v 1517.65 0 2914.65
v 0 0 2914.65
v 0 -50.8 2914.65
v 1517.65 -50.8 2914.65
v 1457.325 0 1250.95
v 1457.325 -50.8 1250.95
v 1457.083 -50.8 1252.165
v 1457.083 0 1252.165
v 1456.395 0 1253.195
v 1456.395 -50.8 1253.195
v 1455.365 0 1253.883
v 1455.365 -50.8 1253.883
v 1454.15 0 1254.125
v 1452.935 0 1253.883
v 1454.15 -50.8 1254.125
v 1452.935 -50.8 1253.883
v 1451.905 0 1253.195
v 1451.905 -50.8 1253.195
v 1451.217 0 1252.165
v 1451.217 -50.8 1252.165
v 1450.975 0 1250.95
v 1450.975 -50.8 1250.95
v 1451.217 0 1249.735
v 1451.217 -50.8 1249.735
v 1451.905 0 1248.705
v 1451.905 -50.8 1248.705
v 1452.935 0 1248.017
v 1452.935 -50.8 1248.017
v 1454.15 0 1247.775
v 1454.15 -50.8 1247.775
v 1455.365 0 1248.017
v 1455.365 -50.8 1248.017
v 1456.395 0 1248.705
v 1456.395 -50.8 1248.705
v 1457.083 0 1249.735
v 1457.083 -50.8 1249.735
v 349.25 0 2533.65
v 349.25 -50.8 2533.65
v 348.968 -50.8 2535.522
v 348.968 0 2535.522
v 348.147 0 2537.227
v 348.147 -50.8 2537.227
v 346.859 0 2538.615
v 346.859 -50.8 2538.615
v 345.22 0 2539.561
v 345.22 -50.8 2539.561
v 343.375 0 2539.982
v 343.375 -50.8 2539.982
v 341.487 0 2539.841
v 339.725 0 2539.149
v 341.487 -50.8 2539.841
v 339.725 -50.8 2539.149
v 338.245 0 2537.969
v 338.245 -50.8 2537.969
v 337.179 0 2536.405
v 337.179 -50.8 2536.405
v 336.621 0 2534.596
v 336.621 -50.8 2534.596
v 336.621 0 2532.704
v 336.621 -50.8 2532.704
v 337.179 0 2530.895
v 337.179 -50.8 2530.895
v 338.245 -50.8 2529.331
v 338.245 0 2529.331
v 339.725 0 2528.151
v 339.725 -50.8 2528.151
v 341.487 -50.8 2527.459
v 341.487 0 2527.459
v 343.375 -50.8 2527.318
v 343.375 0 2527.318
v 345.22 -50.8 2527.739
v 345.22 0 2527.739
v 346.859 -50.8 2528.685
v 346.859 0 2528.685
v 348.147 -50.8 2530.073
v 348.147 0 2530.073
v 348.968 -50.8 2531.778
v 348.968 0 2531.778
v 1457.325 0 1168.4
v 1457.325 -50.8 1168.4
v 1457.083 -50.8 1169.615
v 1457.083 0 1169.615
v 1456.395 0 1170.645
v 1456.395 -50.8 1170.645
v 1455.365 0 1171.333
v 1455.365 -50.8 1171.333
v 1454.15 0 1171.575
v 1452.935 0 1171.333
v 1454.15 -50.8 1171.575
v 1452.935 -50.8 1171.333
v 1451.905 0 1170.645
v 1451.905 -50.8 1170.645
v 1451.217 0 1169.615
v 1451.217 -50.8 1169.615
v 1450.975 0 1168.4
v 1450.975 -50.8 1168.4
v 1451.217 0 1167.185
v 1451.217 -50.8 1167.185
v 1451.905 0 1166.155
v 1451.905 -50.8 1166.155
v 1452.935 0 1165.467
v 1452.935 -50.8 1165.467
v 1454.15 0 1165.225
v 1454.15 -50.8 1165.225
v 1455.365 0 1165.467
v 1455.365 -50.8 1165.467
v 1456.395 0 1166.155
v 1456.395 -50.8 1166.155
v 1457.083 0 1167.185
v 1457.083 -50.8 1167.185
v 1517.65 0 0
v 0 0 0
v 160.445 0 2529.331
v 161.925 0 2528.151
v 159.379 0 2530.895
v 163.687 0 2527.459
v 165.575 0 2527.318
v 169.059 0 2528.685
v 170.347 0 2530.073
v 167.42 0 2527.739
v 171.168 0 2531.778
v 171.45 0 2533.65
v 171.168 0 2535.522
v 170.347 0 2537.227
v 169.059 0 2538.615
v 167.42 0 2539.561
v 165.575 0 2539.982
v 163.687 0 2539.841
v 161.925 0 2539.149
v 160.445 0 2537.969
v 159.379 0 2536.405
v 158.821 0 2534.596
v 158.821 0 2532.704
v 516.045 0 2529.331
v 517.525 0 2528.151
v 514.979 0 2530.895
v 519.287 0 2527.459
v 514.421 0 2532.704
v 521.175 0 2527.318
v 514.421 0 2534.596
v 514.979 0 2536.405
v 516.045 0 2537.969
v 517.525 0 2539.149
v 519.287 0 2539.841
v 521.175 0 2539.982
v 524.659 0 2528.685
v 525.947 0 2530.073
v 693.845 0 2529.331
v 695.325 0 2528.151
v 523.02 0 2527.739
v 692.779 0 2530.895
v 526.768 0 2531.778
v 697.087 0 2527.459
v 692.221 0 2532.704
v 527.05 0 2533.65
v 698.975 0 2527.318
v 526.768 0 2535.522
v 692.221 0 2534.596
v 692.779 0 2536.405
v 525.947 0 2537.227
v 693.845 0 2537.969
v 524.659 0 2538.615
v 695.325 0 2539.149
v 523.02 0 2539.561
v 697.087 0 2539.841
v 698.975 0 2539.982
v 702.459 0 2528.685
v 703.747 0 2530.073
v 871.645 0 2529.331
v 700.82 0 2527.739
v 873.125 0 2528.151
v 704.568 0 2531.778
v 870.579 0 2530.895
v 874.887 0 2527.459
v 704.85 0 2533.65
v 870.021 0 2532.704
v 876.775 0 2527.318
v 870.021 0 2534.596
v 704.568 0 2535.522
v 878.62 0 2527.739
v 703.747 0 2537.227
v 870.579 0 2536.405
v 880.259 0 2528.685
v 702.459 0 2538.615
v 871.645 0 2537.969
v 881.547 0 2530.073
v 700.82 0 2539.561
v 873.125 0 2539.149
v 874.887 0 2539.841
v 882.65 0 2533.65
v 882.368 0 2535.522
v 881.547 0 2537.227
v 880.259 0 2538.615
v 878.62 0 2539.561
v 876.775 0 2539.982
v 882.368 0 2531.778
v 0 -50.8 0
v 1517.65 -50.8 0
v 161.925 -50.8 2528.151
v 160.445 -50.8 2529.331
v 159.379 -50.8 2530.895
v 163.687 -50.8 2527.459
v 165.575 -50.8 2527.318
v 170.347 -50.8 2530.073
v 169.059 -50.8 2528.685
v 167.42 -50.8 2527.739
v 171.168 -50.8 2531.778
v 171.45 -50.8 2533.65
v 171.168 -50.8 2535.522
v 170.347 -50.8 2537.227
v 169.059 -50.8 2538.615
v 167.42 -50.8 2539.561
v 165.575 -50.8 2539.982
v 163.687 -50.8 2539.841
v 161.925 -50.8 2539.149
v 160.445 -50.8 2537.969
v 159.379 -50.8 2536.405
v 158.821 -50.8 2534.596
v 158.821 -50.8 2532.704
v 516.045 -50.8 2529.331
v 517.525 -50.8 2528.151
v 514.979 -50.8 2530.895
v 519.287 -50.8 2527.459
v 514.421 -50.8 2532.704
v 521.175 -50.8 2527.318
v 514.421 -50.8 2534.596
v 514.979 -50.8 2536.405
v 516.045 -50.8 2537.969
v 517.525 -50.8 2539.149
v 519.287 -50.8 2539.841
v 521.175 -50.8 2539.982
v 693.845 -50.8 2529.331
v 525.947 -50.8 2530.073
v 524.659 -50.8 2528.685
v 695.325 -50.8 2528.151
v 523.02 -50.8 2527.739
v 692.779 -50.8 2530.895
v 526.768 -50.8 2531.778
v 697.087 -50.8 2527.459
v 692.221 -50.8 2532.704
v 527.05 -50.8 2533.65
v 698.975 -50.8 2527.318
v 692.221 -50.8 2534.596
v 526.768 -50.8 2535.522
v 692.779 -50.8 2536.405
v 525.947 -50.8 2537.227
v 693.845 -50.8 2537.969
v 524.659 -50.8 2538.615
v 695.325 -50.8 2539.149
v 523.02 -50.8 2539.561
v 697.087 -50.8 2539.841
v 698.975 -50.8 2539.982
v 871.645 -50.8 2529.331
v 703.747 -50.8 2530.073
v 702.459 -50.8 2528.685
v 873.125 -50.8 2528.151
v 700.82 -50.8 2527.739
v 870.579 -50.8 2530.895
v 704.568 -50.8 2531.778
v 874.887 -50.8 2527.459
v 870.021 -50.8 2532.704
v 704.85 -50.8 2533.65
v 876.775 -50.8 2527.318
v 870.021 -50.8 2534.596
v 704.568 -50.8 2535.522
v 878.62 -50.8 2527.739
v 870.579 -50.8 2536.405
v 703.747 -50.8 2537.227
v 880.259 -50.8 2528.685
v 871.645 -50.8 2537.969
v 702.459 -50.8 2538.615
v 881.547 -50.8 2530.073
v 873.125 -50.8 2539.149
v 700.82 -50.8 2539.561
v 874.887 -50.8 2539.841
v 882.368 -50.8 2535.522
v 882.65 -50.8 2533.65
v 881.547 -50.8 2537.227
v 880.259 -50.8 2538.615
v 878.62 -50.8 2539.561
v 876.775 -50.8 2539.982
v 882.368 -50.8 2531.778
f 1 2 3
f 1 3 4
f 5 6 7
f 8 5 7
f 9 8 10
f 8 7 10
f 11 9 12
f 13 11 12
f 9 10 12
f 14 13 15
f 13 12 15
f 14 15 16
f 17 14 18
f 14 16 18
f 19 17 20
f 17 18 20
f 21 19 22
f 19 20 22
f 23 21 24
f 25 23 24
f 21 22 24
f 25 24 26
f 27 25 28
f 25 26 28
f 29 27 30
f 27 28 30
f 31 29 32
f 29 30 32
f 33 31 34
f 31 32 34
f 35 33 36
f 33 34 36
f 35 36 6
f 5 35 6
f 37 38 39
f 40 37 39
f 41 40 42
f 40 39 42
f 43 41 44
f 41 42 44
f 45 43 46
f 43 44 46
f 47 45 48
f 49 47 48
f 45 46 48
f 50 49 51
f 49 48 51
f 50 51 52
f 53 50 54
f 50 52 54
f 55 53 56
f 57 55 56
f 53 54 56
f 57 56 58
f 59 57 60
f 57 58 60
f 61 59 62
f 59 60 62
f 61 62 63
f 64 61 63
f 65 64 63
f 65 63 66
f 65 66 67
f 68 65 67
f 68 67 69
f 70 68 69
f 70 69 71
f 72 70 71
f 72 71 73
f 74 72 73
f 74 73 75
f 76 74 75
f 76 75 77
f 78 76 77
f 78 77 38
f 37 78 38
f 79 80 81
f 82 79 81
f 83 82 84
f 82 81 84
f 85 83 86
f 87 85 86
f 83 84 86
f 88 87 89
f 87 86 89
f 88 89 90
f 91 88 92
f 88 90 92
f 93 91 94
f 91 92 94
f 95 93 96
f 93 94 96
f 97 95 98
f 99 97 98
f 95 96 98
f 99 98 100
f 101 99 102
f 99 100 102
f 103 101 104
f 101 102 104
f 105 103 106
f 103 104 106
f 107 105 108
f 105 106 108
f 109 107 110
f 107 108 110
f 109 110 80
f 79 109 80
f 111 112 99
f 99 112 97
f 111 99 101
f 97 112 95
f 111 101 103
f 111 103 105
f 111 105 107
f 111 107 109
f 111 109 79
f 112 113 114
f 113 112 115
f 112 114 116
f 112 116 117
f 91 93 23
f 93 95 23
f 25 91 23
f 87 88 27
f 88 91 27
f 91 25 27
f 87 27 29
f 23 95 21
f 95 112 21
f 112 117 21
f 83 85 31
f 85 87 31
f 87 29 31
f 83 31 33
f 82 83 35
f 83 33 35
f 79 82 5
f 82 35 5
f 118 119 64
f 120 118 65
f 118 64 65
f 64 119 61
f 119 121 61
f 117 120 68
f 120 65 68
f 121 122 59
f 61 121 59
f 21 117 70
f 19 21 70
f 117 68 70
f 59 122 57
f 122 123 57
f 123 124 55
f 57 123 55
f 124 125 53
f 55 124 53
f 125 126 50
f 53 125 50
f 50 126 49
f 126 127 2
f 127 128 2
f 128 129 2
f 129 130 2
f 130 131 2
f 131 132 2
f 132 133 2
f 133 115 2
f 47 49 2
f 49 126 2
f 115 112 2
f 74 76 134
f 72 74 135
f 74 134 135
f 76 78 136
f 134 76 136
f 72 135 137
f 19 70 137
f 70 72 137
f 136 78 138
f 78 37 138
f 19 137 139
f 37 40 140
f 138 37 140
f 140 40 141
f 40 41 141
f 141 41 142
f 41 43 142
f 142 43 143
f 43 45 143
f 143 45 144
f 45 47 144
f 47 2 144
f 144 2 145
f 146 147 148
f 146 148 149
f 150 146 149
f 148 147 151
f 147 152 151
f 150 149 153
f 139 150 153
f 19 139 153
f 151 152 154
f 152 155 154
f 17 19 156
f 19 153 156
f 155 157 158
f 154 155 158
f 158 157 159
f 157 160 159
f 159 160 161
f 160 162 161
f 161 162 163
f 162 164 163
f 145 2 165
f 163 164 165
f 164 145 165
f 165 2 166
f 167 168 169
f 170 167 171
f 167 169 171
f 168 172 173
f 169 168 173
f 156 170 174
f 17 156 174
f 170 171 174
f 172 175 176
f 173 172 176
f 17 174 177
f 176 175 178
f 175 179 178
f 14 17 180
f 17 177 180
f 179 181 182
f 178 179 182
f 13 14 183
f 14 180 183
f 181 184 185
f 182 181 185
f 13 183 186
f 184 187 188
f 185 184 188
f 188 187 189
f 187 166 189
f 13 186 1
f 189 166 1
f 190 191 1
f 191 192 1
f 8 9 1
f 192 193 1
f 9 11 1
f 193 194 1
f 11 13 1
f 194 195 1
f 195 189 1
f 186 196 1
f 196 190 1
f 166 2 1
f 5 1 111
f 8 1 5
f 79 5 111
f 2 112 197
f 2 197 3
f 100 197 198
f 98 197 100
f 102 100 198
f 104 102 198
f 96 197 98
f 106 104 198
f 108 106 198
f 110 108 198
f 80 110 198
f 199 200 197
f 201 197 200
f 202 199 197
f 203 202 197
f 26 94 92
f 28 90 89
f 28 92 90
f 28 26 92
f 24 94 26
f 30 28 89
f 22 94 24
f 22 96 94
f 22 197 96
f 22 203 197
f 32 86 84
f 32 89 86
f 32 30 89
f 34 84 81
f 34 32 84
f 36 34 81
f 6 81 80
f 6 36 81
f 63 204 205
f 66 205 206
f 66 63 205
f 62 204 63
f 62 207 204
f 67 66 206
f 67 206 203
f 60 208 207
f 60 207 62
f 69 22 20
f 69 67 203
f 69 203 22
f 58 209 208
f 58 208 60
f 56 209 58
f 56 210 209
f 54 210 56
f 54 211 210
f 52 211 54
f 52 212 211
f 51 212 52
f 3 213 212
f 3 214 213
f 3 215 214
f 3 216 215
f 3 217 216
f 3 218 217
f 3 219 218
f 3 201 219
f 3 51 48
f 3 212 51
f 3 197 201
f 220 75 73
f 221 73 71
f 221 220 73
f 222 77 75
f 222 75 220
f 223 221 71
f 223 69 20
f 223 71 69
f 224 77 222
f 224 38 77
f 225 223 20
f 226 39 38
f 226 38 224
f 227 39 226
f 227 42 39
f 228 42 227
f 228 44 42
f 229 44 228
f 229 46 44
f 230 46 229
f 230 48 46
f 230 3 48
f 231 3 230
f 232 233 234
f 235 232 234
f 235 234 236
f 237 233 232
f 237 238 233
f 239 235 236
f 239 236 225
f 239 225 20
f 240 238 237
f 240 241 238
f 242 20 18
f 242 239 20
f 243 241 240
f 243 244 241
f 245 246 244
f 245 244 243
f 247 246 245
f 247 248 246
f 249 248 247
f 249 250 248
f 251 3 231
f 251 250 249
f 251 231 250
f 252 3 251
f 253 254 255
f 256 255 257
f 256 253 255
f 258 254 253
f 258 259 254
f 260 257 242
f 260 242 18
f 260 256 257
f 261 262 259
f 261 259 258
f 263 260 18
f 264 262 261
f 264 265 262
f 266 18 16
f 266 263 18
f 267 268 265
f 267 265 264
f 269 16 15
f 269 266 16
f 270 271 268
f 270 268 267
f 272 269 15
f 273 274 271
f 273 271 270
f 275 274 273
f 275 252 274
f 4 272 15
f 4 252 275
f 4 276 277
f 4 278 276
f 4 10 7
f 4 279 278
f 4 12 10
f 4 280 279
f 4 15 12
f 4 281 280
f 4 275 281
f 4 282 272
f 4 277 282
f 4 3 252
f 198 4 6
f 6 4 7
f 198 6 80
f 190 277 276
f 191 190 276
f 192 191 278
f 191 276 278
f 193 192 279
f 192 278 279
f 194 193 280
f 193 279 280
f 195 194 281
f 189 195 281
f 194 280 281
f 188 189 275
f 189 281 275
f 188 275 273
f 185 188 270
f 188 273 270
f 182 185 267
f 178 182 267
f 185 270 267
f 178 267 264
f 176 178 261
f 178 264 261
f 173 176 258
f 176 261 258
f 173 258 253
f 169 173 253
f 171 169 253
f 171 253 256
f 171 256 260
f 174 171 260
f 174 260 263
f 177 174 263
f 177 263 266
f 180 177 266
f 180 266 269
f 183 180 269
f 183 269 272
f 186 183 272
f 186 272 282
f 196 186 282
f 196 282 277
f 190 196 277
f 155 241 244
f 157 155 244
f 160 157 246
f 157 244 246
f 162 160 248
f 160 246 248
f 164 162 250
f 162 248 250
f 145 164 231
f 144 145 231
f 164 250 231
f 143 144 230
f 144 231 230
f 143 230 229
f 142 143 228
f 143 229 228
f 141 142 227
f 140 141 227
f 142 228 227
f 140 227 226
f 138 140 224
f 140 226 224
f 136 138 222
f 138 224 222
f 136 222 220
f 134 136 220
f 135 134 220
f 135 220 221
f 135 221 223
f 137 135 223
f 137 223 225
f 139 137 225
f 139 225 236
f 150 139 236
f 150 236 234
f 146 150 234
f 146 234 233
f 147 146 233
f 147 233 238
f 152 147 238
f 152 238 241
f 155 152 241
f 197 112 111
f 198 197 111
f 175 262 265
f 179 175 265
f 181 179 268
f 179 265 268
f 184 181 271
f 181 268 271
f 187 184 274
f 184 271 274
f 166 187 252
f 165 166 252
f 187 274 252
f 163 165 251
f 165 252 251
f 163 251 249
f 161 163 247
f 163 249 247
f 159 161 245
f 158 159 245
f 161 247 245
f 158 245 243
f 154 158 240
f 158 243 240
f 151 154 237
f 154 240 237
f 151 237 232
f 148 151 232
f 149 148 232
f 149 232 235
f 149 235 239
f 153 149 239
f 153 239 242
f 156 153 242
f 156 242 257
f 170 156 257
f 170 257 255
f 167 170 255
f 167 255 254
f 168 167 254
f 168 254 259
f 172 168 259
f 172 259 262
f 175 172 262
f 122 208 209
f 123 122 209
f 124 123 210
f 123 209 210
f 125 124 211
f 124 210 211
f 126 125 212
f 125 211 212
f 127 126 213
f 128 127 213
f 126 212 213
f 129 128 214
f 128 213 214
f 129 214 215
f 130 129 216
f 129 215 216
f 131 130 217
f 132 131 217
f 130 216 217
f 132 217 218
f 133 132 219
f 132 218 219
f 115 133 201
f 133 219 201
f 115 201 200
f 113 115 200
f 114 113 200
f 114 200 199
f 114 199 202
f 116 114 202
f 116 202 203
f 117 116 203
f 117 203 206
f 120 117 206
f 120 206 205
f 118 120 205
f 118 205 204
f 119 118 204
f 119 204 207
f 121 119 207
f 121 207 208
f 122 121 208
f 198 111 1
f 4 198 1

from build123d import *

# Parameters (mm, degrees)
F0_W     = 1517.65
F0_H     = 2914.65
F1_DEPTH = 50.8
F2_R     = 6.35
F3_DEPTH = 50.801
F4_R     = 3.175
F5_DEPTH = 50.801


with BuildPart() as f1:
    # F0 (on Front) → F1 (new body)
    with BuildSketch(Plane.XZ):
        with Locations((758.825, 1457.325)):
            Rectangle(F0_W, F0_H)
    extrude(amount=F1_DEPTH)

    # F2 (on face) → F3 (cut, through all)
    with BuildSketch(Plane.XZ.offset(50.8)):
        with Locations((165.1, 2533.65)):
            Circle(F2_R)
        with Locations((342.9, 2533.65)):
            Circle(F2_R)
        with Locations((520.7, 2533.65)):
            Circle(F2_R)
        with Locations((698.5, 2533.65)):
            Circle(F2_R)
        with Locations((876.3, 2533.65)):
            Circle(F2_R)
    extrude(amount=-F3_DEPTH, mode=Mode.SUBTRACT)

    # F4 (on face) → F5 (cut, through all)
    with BuildSketch(Plane.XZ.offset(50.8)):
        with Locations((1454.15, 1250.95)):
            Circle(F4_R)
        with Locations((1454.15, 1168.4)):
            Circle(F4_R)
    extrude(amount=-F5_DEPTH, mode=Mode.SUBTRACT)


solid = f1.part
